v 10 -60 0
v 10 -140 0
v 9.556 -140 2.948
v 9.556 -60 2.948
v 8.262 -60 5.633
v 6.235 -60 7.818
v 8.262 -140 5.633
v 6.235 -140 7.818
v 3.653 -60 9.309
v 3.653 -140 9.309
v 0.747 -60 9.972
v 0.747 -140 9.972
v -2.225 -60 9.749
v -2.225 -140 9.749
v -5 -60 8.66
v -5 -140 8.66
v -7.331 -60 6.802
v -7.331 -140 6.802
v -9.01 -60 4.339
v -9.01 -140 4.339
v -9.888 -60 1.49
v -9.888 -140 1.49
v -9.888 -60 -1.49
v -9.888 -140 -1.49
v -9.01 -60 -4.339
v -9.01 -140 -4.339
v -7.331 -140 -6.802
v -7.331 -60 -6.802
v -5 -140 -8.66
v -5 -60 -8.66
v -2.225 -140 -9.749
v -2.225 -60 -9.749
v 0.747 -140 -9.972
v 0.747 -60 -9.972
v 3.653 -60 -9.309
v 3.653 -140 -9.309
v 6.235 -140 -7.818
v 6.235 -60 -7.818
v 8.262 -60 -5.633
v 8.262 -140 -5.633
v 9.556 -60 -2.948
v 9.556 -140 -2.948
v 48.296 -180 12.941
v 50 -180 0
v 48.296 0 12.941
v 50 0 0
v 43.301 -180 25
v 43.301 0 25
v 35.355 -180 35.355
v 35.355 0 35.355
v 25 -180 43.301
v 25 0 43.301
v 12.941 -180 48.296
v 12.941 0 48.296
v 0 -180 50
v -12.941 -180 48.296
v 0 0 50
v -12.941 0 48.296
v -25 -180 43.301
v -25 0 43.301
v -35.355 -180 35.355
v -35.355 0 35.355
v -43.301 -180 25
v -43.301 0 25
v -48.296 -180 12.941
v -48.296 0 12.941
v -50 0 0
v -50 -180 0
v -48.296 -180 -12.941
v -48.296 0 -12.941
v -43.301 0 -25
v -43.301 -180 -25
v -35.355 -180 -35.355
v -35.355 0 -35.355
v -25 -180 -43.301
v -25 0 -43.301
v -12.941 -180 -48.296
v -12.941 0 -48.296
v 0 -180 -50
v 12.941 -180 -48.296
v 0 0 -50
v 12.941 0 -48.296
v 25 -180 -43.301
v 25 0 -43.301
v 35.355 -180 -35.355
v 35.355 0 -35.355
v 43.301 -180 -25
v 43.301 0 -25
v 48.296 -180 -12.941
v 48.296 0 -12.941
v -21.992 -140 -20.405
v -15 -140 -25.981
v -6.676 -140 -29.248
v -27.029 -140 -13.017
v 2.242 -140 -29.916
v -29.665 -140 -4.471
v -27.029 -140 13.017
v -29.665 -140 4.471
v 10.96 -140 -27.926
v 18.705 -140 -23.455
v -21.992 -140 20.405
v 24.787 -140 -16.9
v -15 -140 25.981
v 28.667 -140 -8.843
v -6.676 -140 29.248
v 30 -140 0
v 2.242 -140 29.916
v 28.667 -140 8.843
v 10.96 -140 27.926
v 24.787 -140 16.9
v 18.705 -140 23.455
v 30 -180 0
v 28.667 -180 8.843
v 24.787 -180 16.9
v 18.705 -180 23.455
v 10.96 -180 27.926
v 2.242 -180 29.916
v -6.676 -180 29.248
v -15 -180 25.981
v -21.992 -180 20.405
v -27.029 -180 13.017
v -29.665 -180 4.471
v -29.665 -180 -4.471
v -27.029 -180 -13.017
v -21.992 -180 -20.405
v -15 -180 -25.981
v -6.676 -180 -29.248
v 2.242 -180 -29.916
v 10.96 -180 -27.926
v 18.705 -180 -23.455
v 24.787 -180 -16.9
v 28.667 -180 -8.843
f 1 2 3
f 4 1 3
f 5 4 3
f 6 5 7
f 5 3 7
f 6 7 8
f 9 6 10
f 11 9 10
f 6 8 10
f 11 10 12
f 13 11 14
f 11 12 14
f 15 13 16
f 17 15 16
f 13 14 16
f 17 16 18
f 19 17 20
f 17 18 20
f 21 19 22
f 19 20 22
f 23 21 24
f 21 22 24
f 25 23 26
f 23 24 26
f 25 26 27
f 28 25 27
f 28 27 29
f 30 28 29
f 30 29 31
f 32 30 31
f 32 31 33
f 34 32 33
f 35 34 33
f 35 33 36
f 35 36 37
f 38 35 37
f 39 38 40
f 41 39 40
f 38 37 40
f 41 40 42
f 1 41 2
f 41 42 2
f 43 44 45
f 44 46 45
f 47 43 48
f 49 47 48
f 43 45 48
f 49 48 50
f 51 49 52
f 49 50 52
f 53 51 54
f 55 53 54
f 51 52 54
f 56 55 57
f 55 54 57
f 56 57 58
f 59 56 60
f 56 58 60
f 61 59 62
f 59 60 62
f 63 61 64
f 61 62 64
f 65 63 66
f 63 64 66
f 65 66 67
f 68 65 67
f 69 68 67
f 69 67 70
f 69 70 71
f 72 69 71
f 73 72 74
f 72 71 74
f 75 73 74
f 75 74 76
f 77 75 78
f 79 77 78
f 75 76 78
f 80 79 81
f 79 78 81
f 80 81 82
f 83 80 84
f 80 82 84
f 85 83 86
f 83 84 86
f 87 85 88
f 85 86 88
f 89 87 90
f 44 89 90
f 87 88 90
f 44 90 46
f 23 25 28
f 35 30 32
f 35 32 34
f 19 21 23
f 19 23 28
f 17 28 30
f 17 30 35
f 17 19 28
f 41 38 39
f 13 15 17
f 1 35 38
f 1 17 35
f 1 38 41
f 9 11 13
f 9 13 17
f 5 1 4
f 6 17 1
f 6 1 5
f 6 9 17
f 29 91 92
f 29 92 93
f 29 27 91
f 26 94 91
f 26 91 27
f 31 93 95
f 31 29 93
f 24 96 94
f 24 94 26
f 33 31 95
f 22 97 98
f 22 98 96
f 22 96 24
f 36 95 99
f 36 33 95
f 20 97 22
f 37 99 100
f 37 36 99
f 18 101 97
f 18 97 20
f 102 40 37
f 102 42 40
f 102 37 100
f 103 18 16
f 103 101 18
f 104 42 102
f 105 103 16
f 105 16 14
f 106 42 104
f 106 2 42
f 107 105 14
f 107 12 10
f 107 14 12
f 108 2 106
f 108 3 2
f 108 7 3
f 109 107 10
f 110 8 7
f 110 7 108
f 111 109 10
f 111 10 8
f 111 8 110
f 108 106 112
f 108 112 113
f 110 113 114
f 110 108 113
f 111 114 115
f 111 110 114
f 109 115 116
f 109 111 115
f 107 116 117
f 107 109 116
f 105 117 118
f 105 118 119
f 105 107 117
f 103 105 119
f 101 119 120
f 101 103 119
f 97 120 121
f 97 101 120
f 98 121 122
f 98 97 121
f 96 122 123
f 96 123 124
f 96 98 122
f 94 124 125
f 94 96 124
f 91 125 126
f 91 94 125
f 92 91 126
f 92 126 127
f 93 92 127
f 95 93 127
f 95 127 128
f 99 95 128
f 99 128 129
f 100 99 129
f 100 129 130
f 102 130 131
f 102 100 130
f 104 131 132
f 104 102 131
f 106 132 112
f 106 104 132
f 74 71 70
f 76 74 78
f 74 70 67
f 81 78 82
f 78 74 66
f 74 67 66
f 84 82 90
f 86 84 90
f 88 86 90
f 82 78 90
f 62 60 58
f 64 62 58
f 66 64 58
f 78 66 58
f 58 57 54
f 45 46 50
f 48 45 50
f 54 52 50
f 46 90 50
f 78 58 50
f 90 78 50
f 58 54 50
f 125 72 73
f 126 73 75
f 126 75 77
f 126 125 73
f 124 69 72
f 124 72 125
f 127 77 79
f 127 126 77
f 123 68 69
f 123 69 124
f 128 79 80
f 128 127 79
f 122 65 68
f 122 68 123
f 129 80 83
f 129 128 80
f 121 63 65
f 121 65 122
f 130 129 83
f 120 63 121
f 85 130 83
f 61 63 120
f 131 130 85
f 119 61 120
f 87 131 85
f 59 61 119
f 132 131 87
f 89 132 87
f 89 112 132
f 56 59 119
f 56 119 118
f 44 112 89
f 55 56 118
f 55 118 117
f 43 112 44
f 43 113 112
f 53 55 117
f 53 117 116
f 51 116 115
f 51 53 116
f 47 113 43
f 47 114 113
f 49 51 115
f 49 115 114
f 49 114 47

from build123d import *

# Parameters (mm, degrees)
F0_R     = 50
F1_DEPTH = 140
F2_R     = 50
F2_R_2   = 30
F3_DEPTH = 40
F4_R     = 10
F5_DEPTH = 80


with BuildPart() as f1:
    # F0 (on Front) → F1 (new body)
    with BuildSketch(Plane.XZ):
        Circle(F0_R)
    extrude(amount=F1_DEPTH)

    # F2 (on face) → F3 (join)
    with BuildSketch(Plane.XZ.offset(140)):
        Circle(F2_R)
        Circle(F2_R_2, mode=Mode.SUBTRACT)
    extrude(amount=F3_DEPTH)

    # F4 (on face) → F5 (cut)
    with BuildSketch(Plane.XZ.offset(140)):
        Circle(F4_R)
    extrude(amount=-F5_DEPTH, mode=Mode.SUBTRACT)


solid = f1.part
